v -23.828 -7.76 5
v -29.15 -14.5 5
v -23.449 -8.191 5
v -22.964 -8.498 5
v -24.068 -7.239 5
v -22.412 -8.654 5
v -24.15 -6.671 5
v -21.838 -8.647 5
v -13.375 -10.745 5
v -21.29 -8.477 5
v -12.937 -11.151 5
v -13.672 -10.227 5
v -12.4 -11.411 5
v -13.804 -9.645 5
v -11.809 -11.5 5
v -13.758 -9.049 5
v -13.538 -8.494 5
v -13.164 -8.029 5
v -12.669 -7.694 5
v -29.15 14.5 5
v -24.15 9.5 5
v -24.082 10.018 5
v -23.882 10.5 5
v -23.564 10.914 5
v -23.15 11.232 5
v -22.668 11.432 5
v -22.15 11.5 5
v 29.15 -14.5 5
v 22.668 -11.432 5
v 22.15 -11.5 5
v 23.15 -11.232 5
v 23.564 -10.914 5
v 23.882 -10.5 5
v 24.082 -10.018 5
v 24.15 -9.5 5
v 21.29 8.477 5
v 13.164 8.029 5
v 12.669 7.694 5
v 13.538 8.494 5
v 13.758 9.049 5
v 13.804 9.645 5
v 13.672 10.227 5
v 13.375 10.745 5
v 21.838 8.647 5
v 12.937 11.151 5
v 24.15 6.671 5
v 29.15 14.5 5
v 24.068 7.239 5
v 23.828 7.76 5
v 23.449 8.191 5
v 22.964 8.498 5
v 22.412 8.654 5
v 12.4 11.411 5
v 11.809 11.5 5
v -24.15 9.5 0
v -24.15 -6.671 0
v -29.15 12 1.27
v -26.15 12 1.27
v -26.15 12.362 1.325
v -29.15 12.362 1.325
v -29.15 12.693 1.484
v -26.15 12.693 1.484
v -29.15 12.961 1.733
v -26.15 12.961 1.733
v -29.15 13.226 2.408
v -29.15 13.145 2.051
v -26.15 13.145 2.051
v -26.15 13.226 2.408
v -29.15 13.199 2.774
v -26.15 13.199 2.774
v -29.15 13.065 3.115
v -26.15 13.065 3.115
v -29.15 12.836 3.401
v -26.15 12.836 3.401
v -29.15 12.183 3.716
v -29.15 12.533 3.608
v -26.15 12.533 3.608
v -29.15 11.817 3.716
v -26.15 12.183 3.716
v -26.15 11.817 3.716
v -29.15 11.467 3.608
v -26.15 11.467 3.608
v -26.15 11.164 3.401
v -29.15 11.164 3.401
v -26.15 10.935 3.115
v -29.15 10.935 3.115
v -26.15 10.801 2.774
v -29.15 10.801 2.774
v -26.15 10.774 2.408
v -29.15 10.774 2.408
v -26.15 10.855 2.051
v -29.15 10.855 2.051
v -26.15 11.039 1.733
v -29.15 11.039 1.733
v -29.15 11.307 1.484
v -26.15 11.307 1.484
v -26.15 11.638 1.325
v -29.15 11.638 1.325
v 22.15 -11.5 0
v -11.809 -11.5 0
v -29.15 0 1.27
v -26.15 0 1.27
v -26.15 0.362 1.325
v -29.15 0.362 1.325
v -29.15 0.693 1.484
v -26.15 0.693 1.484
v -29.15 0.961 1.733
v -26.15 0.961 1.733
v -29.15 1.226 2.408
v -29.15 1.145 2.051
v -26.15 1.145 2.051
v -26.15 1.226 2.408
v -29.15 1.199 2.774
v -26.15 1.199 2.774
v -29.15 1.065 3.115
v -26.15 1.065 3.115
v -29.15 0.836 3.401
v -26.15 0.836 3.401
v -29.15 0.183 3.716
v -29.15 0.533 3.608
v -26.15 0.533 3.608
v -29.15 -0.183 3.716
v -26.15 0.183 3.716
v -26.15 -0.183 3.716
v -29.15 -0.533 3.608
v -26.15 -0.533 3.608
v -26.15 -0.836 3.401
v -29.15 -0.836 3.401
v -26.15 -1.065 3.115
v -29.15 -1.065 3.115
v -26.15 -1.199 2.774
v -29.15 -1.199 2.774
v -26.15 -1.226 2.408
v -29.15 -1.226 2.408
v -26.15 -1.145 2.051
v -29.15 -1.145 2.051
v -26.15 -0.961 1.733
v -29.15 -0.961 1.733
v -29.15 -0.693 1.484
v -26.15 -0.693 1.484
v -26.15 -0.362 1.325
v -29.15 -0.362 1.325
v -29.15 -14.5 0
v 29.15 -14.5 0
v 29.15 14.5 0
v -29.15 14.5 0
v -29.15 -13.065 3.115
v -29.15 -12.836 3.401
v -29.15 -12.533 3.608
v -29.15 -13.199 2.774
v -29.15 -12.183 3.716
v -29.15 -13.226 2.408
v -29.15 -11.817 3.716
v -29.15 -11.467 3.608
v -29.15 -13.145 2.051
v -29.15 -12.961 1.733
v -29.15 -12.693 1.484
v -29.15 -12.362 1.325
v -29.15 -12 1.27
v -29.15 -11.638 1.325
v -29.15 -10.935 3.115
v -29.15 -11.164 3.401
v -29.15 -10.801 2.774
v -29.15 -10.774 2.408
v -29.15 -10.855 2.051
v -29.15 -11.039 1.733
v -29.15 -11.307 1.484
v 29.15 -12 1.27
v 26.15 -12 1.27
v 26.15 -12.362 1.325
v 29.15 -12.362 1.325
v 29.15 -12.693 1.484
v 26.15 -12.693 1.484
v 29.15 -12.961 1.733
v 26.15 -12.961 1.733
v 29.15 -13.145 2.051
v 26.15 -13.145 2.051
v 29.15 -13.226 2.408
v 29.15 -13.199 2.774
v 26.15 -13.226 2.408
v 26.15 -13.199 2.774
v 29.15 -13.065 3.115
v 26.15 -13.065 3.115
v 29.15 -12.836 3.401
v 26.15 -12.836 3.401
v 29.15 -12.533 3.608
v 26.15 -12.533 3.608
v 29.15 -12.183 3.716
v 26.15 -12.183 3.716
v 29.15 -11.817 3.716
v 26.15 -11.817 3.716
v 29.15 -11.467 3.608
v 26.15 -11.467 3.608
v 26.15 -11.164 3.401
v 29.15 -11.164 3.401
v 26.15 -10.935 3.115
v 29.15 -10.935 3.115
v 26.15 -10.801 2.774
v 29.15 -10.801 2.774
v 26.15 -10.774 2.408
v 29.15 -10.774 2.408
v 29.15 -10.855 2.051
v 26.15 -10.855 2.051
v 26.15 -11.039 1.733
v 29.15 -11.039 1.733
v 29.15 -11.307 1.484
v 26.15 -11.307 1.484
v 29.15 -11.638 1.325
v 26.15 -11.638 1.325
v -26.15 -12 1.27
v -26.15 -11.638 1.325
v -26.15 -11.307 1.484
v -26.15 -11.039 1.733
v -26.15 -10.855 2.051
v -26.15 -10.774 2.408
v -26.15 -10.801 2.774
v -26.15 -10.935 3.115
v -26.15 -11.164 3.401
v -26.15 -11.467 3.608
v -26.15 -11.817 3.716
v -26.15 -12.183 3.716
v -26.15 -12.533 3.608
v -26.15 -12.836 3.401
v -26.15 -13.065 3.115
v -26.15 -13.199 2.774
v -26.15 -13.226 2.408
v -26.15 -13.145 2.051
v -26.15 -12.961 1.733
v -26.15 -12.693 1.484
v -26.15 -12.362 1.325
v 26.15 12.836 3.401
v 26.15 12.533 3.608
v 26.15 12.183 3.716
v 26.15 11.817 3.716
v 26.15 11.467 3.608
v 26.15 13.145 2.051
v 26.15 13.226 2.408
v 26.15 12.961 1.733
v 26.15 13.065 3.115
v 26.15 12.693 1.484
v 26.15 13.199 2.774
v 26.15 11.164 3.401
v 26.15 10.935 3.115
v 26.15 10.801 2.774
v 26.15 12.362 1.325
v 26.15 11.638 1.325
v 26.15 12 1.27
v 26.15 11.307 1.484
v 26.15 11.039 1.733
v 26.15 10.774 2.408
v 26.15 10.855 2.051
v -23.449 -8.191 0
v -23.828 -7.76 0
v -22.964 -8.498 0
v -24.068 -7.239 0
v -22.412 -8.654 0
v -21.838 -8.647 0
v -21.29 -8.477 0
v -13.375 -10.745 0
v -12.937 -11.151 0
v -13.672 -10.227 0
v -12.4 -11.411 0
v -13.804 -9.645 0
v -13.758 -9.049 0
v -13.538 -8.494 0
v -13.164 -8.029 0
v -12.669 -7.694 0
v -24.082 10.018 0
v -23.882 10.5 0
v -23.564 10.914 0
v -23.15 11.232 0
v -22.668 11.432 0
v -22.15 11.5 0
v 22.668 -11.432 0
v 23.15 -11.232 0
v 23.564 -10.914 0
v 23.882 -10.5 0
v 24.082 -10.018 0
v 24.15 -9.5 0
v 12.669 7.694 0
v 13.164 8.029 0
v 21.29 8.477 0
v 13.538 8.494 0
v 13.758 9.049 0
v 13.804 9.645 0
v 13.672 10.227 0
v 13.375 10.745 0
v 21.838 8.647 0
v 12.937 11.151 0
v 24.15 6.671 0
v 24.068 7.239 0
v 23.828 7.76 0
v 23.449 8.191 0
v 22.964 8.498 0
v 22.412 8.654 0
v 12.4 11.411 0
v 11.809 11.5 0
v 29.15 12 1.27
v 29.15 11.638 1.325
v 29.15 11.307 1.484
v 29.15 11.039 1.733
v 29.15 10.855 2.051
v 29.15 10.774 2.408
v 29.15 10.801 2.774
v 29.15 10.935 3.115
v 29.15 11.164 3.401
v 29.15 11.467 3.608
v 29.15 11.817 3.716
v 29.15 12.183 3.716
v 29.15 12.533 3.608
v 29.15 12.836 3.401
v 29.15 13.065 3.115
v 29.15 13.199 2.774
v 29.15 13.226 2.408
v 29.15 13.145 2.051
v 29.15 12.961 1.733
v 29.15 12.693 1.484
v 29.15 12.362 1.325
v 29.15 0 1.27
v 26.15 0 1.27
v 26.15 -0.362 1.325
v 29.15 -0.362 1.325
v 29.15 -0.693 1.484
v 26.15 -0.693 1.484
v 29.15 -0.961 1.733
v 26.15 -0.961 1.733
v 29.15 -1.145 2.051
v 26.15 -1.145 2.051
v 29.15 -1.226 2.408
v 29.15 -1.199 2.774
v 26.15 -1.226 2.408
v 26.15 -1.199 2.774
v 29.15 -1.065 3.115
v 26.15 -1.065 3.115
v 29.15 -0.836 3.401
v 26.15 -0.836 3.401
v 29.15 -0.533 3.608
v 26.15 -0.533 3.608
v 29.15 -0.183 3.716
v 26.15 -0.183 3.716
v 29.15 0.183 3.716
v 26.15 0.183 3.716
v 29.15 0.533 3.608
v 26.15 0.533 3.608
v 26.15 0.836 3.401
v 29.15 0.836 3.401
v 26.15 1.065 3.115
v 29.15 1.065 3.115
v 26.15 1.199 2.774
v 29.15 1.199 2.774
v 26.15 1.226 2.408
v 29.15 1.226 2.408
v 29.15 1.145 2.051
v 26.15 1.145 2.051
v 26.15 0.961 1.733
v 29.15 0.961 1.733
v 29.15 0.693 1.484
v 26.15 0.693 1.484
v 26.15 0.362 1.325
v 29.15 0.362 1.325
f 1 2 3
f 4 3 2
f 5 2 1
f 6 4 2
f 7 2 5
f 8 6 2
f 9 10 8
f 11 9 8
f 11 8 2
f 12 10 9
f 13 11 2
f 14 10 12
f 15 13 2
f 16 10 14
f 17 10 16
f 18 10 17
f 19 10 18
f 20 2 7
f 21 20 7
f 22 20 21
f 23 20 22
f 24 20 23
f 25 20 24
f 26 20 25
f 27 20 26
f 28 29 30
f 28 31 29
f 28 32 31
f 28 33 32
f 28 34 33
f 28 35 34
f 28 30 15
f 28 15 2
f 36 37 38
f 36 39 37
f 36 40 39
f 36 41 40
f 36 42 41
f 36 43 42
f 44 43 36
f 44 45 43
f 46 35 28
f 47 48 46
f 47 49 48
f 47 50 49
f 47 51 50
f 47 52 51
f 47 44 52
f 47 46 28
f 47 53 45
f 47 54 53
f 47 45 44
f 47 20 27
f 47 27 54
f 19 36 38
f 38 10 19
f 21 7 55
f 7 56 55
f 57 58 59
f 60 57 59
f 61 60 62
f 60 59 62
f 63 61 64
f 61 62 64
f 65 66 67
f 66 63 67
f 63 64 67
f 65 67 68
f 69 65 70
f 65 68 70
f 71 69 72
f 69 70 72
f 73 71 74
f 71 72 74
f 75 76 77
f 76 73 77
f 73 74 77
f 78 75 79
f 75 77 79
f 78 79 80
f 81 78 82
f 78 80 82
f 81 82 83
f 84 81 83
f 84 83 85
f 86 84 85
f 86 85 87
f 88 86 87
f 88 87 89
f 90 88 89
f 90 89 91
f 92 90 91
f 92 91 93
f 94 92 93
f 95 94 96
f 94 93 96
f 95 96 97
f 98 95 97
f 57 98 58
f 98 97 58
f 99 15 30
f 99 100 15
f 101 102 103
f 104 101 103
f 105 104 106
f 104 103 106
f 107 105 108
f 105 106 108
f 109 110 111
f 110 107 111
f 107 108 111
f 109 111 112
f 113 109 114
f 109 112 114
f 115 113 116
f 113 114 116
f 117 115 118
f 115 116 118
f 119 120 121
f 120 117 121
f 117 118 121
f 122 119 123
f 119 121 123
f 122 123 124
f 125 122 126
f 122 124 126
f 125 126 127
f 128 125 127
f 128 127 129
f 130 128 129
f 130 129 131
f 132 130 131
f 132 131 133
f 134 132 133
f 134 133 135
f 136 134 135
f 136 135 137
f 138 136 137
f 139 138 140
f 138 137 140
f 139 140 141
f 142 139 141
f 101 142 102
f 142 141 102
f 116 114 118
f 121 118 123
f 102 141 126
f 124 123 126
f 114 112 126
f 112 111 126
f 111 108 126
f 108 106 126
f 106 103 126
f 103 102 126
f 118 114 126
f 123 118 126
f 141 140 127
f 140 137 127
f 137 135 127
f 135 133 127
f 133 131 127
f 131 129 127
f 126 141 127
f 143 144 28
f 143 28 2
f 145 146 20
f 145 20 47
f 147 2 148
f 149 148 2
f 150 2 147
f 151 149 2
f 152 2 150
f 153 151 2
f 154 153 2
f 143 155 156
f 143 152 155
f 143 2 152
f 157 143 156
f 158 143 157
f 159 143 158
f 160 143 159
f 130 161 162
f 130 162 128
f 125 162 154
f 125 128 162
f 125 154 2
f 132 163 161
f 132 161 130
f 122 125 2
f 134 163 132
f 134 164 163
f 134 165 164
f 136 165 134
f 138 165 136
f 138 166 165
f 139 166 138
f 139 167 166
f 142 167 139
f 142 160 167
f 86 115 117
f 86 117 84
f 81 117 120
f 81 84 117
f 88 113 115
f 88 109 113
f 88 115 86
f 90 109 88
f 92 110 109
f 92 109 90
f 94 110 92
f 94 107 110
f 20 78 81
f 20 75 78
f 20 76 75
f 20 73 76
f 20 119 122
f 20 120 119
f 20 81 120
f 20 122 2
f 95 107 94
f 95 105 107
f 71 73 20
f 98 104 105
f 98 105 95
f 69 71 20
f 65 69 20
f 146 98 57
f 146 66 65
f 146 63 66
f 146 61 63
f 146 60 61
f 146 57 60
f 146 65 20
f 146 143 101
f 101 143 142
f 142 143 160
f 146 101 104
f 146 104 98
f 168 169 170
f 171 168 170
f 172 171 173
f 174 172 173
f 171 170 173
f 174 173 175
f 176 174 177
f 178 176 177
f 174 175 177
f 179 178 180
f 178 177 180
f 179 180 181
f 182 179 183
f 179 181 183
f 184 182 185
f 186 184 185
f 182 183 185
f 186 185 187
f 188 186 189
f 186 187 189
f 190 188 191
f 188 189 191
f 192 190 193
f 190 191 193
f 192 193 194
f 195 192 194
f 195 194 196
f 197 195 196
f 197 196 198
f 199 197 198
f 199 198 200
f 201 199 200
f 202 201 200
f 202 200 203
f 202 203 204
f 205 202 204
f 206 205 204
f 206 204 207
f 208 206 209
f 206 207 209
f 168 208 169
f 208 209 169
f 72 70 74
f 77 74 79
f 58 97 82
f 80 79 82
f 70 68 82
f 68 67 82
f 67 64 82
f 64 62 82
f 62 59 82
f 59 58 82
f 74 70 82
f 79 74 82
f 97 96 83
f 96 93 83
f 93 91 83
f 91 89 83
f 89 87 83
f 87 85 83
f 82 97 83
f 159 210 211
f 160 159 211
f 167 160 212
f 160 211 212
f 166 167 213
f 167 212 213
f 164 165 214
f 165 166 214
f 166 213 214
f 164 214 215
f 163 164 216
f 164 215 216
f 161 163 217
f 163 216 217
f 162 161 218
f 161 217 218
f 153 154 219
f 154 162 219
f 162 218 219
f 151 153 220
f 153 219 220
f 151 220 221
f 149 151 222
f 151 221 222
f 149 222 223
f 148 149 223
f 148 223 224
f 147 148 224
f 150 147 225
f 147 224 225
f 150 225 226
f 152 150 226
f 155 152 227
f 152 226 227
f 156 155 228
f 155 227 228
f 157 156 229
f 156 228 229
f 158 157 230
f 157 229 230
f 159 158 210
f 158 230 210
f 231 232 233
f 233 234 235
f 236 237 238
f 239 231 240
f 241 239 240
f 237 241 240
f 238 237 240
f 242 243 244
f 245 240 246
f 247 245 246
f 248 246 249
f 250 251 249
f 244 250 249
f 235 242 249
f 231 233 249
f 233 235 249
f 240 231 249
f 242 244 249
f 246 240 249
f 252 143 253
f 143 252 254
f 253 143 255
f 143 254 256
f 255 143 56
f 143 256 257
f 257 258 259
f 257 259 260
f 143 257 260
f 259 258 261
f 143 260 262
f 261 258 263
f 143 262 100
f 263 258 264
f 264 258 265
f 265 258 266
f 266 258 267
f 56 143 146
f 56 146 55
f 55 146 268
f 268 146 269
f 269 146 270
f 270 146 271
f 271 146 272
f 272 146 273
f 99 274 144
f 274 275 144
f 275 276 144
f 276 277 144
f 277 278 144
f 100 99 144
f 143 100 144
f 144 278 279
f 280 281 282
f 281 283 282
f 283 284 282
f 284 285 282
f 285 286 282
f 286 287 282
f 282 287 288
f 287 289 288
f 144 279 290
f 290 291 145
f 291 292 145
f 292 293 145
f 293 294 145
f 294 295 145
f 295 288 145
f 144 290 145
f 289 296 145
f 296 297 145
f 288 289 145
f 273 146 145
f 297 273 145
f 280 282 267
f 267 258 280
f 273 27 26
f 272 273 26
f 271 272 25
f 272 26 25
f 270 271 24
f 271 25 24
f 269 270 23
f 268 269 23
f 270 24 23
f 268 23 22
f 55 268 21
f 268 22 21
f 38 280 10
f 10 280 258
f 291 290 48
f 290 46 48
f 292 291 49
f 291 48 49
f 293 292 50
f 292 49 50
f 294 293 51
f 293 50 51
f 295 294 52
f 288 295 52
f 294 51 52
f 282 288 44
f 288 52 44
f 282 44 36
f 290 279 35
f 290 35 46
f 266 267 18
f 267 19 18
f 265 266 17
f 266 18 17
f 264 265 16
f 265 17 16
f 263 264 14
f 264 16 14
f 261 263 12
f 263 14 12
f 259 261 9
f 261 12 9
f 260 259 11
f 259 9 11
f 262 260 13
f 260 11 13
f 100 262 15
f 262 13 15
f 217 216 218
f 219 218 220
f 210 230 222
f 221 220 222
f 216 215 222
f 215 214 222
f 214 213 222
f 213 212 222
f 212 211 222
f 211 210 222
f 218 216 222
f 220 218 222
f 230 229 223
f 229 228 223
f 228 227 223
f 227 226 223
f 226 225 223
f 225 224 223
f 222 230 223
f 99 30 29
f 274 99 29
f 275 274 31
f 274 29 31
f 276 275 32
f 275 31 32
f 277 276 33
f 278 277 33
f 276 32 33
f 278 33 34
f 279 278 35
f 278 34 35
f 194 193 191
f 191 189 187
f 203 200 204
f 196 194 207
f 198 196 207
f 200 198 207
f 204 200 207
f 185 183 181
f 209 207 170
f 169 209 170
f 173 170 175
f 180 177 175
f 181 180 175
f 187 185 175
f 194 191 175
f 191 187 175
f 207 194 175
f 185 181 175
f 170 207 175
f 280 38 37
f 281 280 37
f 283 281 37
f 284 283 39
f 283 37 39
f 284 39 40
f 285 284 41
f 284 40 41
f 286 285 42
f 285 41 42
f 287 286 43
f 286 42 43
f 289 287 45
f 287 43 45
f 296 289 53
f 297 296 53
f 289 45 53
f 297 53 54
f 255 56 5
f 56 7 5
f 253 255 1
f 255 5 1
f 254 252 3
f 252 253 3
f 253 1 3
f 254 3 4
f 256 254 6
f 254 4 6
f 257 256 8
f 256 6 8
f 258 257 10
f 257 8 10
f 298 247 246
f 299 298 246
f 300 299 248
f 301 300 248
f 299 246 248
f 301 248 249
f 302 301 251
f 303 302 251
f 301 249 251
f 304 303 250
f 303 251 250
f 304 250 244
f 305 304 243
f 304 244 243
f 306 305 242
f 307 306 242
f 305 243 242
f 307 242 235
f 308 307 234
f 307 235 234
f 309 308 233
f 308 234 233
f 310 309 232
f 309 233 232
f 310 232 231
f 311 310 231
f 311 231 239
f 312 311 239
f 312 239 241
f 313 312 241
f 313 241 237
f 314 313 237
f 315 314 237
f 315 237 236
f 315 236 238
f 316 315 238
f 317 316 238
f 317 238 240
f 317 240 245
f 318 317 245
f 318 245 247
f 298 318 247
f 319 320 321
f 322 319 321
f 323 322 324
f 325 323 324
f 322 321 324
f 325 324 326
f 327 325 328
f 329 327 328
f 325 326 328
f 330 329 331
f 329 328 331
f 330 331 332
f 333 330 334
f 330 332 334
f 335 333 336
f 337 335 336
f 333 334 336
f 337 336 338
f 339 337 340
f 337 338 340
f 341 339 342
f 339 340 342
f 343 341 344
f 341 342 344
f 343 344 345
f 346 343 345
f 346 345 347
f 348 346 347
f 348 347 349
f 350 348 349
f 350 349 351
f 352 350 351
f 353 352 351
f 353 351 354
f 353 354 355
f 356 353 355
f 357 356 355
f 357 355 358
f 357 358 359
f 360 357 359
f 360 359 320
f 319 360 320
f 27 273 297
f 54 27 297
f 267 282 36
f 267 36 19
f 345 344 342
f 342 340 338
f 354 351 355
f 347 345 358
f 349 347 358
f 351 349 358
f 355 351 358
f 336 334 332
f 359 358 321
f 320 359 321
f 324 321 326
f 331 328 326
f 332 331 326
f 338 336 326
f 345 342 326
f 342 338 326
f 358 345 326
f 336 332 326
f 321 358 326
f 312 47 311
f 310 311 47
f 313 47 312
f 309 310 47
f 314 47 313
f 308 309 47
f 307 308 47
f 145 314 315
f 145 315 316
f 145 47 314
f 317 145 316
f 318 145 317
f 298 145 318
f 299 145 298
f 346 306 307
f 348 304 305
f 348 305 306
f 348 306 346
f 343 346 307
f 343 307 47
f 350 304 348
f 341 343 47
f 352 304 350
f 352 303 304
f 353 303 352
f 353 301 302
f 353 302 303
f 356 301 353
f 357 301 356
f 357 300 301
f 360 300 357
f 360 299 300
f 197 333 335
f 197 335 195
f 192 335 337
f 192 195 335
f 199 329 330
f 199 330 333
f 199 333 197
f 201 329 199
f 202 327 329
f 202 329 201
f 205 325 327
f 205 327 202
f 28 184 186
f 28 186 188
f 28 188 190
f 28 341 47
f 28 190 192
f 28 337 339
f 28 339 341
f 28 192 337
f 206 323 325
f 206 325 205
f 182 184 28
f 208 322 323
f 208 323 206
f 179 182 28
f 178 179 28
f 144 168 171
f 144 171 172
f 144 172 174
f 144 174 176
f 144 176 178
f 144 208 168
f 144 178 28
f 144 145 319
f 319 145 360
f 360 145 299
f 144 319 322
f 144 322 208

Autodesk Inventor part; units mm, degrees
ref_plane "YZ Plane" through (0, 0, 0) normal (1, 0, 0) x (0, 1, 0)
ref_plane "XZ Plane" through (0, 0, 0) normal (0, 1, 0) x (-1, 0, 0)
ref_plane "XY Plane" through (0, 0, 0) normal (0, 0, 1) x (1, 0, 0)
sketch "スケッチ1" plane through (0, 0, 0) normal (0, 0, 1) x (1, 0, 0)
  line L0 (-29.15, 14.5) -> (29.15, 14.5)
  line L1 (29.15, 14.5) -> (29.15, -14.5)
  line L2 (29.15, -14.5) -> (-29.15, -14.5)
  line L3 (-29.15, -14.5) -> (-29.15, 14.5)
  line L4 (-24.15, 11.5) -> (24.15, 11.5) construction
  line L5 (24.15, 11.5) -> (24.15, -11.5) construction
  line L6 (24.15, -11.5) -> (-24.15, -11.5) construction
  line L7 (-24.15, -11.5) -> (-24.15, 11.5) construction
  line L8 (24.15, 11.5) -> (-24.15, -11.5) construction
  line L9 (-24.15, -9.8386) -> (-24.15, 11.5)
  line L10 (-24.15, 11.5) -> (20.6611, 11.5)
  line L11 (20.6611, 11.5) -> (-24.15, -9.8386)
  line L12 (-20.6611, -11.5) -> (24.15, -11.5)
  line L13 (24.15, -11.5) -> (24.15, 9.8386)
  line L14 (24.15, 9.8386) -> (-20.6611, -11.5)
  line L15 (-29.15, 12) -> (29.15, 12) construction
  line L16 (29.15, -12) -> (-29.15, -12) construction
  line L17 (29.15, 12) -> (29.15, -12) construction
  point P0 (0, 0)
  point P1 (0, 11.5)
  point P2 (0, 14.5)
  point P3 (24.15, 0)
  point P4 (29.15, 0)
  dimension "d0" = 5
  dimension "d1" = 3
  dimension "d2" = 1.5
  dimension "d3" = 24
  dimension "d4" = 2.5
  dimension "d16" = 58.3
extrude "押し出し1" add sketch "スケッチ1" along normal blind 5
sketch "スケッチ2" plane through (29.15, -14.5, 0) normal (1, 0, 0) x (0, 0, -1)
  line L0 (0, 29) -> (-5, 29) projected
  line L1 (-5, 0) -> (-5, 29) projected
  line L2 (0, 14.5) -> (-5, 14.5) construction
  point P0 (-2.5, 2.5)
  point P1 (-2.5, 14.5)
  point P2 (-2.5, 26.5)
  point P3 (-2.5, 29)
  dimension "d7" = 24
hole "穴1" at (29.15, -12, 2.5) at (29.15, 0, 2.5) at (29.15, 12, 2.5) direction (-1, 0, 0) diameter 2.459 depth 3 thread size "M3x0.5" class "6H" standard "ISO Metric profile"
mirror "ミラー1" about plane through (0, 0, 0) normal (1, 0, 0) of "穴1"
fillet "フィレット1" radius 2 6 edges at (-20.6611, -11.5, 2.5) (-24.15, -9.8386, 2.5) (24.15, 9.8386, 2.5) (24.15, -11.5, 2.5) (-24.15, 11.5, 2.5) (20.6611, 11.5, 2.5)
equation "\"d3\" = d5_1"
equation "\"d7\" = d3"
equation "\"d5_1\" = 24"
properties part number "リンク_ふくらはぎ_サブフレーム_1_2(予備案)" material "アルミニウム 2014-T4"
